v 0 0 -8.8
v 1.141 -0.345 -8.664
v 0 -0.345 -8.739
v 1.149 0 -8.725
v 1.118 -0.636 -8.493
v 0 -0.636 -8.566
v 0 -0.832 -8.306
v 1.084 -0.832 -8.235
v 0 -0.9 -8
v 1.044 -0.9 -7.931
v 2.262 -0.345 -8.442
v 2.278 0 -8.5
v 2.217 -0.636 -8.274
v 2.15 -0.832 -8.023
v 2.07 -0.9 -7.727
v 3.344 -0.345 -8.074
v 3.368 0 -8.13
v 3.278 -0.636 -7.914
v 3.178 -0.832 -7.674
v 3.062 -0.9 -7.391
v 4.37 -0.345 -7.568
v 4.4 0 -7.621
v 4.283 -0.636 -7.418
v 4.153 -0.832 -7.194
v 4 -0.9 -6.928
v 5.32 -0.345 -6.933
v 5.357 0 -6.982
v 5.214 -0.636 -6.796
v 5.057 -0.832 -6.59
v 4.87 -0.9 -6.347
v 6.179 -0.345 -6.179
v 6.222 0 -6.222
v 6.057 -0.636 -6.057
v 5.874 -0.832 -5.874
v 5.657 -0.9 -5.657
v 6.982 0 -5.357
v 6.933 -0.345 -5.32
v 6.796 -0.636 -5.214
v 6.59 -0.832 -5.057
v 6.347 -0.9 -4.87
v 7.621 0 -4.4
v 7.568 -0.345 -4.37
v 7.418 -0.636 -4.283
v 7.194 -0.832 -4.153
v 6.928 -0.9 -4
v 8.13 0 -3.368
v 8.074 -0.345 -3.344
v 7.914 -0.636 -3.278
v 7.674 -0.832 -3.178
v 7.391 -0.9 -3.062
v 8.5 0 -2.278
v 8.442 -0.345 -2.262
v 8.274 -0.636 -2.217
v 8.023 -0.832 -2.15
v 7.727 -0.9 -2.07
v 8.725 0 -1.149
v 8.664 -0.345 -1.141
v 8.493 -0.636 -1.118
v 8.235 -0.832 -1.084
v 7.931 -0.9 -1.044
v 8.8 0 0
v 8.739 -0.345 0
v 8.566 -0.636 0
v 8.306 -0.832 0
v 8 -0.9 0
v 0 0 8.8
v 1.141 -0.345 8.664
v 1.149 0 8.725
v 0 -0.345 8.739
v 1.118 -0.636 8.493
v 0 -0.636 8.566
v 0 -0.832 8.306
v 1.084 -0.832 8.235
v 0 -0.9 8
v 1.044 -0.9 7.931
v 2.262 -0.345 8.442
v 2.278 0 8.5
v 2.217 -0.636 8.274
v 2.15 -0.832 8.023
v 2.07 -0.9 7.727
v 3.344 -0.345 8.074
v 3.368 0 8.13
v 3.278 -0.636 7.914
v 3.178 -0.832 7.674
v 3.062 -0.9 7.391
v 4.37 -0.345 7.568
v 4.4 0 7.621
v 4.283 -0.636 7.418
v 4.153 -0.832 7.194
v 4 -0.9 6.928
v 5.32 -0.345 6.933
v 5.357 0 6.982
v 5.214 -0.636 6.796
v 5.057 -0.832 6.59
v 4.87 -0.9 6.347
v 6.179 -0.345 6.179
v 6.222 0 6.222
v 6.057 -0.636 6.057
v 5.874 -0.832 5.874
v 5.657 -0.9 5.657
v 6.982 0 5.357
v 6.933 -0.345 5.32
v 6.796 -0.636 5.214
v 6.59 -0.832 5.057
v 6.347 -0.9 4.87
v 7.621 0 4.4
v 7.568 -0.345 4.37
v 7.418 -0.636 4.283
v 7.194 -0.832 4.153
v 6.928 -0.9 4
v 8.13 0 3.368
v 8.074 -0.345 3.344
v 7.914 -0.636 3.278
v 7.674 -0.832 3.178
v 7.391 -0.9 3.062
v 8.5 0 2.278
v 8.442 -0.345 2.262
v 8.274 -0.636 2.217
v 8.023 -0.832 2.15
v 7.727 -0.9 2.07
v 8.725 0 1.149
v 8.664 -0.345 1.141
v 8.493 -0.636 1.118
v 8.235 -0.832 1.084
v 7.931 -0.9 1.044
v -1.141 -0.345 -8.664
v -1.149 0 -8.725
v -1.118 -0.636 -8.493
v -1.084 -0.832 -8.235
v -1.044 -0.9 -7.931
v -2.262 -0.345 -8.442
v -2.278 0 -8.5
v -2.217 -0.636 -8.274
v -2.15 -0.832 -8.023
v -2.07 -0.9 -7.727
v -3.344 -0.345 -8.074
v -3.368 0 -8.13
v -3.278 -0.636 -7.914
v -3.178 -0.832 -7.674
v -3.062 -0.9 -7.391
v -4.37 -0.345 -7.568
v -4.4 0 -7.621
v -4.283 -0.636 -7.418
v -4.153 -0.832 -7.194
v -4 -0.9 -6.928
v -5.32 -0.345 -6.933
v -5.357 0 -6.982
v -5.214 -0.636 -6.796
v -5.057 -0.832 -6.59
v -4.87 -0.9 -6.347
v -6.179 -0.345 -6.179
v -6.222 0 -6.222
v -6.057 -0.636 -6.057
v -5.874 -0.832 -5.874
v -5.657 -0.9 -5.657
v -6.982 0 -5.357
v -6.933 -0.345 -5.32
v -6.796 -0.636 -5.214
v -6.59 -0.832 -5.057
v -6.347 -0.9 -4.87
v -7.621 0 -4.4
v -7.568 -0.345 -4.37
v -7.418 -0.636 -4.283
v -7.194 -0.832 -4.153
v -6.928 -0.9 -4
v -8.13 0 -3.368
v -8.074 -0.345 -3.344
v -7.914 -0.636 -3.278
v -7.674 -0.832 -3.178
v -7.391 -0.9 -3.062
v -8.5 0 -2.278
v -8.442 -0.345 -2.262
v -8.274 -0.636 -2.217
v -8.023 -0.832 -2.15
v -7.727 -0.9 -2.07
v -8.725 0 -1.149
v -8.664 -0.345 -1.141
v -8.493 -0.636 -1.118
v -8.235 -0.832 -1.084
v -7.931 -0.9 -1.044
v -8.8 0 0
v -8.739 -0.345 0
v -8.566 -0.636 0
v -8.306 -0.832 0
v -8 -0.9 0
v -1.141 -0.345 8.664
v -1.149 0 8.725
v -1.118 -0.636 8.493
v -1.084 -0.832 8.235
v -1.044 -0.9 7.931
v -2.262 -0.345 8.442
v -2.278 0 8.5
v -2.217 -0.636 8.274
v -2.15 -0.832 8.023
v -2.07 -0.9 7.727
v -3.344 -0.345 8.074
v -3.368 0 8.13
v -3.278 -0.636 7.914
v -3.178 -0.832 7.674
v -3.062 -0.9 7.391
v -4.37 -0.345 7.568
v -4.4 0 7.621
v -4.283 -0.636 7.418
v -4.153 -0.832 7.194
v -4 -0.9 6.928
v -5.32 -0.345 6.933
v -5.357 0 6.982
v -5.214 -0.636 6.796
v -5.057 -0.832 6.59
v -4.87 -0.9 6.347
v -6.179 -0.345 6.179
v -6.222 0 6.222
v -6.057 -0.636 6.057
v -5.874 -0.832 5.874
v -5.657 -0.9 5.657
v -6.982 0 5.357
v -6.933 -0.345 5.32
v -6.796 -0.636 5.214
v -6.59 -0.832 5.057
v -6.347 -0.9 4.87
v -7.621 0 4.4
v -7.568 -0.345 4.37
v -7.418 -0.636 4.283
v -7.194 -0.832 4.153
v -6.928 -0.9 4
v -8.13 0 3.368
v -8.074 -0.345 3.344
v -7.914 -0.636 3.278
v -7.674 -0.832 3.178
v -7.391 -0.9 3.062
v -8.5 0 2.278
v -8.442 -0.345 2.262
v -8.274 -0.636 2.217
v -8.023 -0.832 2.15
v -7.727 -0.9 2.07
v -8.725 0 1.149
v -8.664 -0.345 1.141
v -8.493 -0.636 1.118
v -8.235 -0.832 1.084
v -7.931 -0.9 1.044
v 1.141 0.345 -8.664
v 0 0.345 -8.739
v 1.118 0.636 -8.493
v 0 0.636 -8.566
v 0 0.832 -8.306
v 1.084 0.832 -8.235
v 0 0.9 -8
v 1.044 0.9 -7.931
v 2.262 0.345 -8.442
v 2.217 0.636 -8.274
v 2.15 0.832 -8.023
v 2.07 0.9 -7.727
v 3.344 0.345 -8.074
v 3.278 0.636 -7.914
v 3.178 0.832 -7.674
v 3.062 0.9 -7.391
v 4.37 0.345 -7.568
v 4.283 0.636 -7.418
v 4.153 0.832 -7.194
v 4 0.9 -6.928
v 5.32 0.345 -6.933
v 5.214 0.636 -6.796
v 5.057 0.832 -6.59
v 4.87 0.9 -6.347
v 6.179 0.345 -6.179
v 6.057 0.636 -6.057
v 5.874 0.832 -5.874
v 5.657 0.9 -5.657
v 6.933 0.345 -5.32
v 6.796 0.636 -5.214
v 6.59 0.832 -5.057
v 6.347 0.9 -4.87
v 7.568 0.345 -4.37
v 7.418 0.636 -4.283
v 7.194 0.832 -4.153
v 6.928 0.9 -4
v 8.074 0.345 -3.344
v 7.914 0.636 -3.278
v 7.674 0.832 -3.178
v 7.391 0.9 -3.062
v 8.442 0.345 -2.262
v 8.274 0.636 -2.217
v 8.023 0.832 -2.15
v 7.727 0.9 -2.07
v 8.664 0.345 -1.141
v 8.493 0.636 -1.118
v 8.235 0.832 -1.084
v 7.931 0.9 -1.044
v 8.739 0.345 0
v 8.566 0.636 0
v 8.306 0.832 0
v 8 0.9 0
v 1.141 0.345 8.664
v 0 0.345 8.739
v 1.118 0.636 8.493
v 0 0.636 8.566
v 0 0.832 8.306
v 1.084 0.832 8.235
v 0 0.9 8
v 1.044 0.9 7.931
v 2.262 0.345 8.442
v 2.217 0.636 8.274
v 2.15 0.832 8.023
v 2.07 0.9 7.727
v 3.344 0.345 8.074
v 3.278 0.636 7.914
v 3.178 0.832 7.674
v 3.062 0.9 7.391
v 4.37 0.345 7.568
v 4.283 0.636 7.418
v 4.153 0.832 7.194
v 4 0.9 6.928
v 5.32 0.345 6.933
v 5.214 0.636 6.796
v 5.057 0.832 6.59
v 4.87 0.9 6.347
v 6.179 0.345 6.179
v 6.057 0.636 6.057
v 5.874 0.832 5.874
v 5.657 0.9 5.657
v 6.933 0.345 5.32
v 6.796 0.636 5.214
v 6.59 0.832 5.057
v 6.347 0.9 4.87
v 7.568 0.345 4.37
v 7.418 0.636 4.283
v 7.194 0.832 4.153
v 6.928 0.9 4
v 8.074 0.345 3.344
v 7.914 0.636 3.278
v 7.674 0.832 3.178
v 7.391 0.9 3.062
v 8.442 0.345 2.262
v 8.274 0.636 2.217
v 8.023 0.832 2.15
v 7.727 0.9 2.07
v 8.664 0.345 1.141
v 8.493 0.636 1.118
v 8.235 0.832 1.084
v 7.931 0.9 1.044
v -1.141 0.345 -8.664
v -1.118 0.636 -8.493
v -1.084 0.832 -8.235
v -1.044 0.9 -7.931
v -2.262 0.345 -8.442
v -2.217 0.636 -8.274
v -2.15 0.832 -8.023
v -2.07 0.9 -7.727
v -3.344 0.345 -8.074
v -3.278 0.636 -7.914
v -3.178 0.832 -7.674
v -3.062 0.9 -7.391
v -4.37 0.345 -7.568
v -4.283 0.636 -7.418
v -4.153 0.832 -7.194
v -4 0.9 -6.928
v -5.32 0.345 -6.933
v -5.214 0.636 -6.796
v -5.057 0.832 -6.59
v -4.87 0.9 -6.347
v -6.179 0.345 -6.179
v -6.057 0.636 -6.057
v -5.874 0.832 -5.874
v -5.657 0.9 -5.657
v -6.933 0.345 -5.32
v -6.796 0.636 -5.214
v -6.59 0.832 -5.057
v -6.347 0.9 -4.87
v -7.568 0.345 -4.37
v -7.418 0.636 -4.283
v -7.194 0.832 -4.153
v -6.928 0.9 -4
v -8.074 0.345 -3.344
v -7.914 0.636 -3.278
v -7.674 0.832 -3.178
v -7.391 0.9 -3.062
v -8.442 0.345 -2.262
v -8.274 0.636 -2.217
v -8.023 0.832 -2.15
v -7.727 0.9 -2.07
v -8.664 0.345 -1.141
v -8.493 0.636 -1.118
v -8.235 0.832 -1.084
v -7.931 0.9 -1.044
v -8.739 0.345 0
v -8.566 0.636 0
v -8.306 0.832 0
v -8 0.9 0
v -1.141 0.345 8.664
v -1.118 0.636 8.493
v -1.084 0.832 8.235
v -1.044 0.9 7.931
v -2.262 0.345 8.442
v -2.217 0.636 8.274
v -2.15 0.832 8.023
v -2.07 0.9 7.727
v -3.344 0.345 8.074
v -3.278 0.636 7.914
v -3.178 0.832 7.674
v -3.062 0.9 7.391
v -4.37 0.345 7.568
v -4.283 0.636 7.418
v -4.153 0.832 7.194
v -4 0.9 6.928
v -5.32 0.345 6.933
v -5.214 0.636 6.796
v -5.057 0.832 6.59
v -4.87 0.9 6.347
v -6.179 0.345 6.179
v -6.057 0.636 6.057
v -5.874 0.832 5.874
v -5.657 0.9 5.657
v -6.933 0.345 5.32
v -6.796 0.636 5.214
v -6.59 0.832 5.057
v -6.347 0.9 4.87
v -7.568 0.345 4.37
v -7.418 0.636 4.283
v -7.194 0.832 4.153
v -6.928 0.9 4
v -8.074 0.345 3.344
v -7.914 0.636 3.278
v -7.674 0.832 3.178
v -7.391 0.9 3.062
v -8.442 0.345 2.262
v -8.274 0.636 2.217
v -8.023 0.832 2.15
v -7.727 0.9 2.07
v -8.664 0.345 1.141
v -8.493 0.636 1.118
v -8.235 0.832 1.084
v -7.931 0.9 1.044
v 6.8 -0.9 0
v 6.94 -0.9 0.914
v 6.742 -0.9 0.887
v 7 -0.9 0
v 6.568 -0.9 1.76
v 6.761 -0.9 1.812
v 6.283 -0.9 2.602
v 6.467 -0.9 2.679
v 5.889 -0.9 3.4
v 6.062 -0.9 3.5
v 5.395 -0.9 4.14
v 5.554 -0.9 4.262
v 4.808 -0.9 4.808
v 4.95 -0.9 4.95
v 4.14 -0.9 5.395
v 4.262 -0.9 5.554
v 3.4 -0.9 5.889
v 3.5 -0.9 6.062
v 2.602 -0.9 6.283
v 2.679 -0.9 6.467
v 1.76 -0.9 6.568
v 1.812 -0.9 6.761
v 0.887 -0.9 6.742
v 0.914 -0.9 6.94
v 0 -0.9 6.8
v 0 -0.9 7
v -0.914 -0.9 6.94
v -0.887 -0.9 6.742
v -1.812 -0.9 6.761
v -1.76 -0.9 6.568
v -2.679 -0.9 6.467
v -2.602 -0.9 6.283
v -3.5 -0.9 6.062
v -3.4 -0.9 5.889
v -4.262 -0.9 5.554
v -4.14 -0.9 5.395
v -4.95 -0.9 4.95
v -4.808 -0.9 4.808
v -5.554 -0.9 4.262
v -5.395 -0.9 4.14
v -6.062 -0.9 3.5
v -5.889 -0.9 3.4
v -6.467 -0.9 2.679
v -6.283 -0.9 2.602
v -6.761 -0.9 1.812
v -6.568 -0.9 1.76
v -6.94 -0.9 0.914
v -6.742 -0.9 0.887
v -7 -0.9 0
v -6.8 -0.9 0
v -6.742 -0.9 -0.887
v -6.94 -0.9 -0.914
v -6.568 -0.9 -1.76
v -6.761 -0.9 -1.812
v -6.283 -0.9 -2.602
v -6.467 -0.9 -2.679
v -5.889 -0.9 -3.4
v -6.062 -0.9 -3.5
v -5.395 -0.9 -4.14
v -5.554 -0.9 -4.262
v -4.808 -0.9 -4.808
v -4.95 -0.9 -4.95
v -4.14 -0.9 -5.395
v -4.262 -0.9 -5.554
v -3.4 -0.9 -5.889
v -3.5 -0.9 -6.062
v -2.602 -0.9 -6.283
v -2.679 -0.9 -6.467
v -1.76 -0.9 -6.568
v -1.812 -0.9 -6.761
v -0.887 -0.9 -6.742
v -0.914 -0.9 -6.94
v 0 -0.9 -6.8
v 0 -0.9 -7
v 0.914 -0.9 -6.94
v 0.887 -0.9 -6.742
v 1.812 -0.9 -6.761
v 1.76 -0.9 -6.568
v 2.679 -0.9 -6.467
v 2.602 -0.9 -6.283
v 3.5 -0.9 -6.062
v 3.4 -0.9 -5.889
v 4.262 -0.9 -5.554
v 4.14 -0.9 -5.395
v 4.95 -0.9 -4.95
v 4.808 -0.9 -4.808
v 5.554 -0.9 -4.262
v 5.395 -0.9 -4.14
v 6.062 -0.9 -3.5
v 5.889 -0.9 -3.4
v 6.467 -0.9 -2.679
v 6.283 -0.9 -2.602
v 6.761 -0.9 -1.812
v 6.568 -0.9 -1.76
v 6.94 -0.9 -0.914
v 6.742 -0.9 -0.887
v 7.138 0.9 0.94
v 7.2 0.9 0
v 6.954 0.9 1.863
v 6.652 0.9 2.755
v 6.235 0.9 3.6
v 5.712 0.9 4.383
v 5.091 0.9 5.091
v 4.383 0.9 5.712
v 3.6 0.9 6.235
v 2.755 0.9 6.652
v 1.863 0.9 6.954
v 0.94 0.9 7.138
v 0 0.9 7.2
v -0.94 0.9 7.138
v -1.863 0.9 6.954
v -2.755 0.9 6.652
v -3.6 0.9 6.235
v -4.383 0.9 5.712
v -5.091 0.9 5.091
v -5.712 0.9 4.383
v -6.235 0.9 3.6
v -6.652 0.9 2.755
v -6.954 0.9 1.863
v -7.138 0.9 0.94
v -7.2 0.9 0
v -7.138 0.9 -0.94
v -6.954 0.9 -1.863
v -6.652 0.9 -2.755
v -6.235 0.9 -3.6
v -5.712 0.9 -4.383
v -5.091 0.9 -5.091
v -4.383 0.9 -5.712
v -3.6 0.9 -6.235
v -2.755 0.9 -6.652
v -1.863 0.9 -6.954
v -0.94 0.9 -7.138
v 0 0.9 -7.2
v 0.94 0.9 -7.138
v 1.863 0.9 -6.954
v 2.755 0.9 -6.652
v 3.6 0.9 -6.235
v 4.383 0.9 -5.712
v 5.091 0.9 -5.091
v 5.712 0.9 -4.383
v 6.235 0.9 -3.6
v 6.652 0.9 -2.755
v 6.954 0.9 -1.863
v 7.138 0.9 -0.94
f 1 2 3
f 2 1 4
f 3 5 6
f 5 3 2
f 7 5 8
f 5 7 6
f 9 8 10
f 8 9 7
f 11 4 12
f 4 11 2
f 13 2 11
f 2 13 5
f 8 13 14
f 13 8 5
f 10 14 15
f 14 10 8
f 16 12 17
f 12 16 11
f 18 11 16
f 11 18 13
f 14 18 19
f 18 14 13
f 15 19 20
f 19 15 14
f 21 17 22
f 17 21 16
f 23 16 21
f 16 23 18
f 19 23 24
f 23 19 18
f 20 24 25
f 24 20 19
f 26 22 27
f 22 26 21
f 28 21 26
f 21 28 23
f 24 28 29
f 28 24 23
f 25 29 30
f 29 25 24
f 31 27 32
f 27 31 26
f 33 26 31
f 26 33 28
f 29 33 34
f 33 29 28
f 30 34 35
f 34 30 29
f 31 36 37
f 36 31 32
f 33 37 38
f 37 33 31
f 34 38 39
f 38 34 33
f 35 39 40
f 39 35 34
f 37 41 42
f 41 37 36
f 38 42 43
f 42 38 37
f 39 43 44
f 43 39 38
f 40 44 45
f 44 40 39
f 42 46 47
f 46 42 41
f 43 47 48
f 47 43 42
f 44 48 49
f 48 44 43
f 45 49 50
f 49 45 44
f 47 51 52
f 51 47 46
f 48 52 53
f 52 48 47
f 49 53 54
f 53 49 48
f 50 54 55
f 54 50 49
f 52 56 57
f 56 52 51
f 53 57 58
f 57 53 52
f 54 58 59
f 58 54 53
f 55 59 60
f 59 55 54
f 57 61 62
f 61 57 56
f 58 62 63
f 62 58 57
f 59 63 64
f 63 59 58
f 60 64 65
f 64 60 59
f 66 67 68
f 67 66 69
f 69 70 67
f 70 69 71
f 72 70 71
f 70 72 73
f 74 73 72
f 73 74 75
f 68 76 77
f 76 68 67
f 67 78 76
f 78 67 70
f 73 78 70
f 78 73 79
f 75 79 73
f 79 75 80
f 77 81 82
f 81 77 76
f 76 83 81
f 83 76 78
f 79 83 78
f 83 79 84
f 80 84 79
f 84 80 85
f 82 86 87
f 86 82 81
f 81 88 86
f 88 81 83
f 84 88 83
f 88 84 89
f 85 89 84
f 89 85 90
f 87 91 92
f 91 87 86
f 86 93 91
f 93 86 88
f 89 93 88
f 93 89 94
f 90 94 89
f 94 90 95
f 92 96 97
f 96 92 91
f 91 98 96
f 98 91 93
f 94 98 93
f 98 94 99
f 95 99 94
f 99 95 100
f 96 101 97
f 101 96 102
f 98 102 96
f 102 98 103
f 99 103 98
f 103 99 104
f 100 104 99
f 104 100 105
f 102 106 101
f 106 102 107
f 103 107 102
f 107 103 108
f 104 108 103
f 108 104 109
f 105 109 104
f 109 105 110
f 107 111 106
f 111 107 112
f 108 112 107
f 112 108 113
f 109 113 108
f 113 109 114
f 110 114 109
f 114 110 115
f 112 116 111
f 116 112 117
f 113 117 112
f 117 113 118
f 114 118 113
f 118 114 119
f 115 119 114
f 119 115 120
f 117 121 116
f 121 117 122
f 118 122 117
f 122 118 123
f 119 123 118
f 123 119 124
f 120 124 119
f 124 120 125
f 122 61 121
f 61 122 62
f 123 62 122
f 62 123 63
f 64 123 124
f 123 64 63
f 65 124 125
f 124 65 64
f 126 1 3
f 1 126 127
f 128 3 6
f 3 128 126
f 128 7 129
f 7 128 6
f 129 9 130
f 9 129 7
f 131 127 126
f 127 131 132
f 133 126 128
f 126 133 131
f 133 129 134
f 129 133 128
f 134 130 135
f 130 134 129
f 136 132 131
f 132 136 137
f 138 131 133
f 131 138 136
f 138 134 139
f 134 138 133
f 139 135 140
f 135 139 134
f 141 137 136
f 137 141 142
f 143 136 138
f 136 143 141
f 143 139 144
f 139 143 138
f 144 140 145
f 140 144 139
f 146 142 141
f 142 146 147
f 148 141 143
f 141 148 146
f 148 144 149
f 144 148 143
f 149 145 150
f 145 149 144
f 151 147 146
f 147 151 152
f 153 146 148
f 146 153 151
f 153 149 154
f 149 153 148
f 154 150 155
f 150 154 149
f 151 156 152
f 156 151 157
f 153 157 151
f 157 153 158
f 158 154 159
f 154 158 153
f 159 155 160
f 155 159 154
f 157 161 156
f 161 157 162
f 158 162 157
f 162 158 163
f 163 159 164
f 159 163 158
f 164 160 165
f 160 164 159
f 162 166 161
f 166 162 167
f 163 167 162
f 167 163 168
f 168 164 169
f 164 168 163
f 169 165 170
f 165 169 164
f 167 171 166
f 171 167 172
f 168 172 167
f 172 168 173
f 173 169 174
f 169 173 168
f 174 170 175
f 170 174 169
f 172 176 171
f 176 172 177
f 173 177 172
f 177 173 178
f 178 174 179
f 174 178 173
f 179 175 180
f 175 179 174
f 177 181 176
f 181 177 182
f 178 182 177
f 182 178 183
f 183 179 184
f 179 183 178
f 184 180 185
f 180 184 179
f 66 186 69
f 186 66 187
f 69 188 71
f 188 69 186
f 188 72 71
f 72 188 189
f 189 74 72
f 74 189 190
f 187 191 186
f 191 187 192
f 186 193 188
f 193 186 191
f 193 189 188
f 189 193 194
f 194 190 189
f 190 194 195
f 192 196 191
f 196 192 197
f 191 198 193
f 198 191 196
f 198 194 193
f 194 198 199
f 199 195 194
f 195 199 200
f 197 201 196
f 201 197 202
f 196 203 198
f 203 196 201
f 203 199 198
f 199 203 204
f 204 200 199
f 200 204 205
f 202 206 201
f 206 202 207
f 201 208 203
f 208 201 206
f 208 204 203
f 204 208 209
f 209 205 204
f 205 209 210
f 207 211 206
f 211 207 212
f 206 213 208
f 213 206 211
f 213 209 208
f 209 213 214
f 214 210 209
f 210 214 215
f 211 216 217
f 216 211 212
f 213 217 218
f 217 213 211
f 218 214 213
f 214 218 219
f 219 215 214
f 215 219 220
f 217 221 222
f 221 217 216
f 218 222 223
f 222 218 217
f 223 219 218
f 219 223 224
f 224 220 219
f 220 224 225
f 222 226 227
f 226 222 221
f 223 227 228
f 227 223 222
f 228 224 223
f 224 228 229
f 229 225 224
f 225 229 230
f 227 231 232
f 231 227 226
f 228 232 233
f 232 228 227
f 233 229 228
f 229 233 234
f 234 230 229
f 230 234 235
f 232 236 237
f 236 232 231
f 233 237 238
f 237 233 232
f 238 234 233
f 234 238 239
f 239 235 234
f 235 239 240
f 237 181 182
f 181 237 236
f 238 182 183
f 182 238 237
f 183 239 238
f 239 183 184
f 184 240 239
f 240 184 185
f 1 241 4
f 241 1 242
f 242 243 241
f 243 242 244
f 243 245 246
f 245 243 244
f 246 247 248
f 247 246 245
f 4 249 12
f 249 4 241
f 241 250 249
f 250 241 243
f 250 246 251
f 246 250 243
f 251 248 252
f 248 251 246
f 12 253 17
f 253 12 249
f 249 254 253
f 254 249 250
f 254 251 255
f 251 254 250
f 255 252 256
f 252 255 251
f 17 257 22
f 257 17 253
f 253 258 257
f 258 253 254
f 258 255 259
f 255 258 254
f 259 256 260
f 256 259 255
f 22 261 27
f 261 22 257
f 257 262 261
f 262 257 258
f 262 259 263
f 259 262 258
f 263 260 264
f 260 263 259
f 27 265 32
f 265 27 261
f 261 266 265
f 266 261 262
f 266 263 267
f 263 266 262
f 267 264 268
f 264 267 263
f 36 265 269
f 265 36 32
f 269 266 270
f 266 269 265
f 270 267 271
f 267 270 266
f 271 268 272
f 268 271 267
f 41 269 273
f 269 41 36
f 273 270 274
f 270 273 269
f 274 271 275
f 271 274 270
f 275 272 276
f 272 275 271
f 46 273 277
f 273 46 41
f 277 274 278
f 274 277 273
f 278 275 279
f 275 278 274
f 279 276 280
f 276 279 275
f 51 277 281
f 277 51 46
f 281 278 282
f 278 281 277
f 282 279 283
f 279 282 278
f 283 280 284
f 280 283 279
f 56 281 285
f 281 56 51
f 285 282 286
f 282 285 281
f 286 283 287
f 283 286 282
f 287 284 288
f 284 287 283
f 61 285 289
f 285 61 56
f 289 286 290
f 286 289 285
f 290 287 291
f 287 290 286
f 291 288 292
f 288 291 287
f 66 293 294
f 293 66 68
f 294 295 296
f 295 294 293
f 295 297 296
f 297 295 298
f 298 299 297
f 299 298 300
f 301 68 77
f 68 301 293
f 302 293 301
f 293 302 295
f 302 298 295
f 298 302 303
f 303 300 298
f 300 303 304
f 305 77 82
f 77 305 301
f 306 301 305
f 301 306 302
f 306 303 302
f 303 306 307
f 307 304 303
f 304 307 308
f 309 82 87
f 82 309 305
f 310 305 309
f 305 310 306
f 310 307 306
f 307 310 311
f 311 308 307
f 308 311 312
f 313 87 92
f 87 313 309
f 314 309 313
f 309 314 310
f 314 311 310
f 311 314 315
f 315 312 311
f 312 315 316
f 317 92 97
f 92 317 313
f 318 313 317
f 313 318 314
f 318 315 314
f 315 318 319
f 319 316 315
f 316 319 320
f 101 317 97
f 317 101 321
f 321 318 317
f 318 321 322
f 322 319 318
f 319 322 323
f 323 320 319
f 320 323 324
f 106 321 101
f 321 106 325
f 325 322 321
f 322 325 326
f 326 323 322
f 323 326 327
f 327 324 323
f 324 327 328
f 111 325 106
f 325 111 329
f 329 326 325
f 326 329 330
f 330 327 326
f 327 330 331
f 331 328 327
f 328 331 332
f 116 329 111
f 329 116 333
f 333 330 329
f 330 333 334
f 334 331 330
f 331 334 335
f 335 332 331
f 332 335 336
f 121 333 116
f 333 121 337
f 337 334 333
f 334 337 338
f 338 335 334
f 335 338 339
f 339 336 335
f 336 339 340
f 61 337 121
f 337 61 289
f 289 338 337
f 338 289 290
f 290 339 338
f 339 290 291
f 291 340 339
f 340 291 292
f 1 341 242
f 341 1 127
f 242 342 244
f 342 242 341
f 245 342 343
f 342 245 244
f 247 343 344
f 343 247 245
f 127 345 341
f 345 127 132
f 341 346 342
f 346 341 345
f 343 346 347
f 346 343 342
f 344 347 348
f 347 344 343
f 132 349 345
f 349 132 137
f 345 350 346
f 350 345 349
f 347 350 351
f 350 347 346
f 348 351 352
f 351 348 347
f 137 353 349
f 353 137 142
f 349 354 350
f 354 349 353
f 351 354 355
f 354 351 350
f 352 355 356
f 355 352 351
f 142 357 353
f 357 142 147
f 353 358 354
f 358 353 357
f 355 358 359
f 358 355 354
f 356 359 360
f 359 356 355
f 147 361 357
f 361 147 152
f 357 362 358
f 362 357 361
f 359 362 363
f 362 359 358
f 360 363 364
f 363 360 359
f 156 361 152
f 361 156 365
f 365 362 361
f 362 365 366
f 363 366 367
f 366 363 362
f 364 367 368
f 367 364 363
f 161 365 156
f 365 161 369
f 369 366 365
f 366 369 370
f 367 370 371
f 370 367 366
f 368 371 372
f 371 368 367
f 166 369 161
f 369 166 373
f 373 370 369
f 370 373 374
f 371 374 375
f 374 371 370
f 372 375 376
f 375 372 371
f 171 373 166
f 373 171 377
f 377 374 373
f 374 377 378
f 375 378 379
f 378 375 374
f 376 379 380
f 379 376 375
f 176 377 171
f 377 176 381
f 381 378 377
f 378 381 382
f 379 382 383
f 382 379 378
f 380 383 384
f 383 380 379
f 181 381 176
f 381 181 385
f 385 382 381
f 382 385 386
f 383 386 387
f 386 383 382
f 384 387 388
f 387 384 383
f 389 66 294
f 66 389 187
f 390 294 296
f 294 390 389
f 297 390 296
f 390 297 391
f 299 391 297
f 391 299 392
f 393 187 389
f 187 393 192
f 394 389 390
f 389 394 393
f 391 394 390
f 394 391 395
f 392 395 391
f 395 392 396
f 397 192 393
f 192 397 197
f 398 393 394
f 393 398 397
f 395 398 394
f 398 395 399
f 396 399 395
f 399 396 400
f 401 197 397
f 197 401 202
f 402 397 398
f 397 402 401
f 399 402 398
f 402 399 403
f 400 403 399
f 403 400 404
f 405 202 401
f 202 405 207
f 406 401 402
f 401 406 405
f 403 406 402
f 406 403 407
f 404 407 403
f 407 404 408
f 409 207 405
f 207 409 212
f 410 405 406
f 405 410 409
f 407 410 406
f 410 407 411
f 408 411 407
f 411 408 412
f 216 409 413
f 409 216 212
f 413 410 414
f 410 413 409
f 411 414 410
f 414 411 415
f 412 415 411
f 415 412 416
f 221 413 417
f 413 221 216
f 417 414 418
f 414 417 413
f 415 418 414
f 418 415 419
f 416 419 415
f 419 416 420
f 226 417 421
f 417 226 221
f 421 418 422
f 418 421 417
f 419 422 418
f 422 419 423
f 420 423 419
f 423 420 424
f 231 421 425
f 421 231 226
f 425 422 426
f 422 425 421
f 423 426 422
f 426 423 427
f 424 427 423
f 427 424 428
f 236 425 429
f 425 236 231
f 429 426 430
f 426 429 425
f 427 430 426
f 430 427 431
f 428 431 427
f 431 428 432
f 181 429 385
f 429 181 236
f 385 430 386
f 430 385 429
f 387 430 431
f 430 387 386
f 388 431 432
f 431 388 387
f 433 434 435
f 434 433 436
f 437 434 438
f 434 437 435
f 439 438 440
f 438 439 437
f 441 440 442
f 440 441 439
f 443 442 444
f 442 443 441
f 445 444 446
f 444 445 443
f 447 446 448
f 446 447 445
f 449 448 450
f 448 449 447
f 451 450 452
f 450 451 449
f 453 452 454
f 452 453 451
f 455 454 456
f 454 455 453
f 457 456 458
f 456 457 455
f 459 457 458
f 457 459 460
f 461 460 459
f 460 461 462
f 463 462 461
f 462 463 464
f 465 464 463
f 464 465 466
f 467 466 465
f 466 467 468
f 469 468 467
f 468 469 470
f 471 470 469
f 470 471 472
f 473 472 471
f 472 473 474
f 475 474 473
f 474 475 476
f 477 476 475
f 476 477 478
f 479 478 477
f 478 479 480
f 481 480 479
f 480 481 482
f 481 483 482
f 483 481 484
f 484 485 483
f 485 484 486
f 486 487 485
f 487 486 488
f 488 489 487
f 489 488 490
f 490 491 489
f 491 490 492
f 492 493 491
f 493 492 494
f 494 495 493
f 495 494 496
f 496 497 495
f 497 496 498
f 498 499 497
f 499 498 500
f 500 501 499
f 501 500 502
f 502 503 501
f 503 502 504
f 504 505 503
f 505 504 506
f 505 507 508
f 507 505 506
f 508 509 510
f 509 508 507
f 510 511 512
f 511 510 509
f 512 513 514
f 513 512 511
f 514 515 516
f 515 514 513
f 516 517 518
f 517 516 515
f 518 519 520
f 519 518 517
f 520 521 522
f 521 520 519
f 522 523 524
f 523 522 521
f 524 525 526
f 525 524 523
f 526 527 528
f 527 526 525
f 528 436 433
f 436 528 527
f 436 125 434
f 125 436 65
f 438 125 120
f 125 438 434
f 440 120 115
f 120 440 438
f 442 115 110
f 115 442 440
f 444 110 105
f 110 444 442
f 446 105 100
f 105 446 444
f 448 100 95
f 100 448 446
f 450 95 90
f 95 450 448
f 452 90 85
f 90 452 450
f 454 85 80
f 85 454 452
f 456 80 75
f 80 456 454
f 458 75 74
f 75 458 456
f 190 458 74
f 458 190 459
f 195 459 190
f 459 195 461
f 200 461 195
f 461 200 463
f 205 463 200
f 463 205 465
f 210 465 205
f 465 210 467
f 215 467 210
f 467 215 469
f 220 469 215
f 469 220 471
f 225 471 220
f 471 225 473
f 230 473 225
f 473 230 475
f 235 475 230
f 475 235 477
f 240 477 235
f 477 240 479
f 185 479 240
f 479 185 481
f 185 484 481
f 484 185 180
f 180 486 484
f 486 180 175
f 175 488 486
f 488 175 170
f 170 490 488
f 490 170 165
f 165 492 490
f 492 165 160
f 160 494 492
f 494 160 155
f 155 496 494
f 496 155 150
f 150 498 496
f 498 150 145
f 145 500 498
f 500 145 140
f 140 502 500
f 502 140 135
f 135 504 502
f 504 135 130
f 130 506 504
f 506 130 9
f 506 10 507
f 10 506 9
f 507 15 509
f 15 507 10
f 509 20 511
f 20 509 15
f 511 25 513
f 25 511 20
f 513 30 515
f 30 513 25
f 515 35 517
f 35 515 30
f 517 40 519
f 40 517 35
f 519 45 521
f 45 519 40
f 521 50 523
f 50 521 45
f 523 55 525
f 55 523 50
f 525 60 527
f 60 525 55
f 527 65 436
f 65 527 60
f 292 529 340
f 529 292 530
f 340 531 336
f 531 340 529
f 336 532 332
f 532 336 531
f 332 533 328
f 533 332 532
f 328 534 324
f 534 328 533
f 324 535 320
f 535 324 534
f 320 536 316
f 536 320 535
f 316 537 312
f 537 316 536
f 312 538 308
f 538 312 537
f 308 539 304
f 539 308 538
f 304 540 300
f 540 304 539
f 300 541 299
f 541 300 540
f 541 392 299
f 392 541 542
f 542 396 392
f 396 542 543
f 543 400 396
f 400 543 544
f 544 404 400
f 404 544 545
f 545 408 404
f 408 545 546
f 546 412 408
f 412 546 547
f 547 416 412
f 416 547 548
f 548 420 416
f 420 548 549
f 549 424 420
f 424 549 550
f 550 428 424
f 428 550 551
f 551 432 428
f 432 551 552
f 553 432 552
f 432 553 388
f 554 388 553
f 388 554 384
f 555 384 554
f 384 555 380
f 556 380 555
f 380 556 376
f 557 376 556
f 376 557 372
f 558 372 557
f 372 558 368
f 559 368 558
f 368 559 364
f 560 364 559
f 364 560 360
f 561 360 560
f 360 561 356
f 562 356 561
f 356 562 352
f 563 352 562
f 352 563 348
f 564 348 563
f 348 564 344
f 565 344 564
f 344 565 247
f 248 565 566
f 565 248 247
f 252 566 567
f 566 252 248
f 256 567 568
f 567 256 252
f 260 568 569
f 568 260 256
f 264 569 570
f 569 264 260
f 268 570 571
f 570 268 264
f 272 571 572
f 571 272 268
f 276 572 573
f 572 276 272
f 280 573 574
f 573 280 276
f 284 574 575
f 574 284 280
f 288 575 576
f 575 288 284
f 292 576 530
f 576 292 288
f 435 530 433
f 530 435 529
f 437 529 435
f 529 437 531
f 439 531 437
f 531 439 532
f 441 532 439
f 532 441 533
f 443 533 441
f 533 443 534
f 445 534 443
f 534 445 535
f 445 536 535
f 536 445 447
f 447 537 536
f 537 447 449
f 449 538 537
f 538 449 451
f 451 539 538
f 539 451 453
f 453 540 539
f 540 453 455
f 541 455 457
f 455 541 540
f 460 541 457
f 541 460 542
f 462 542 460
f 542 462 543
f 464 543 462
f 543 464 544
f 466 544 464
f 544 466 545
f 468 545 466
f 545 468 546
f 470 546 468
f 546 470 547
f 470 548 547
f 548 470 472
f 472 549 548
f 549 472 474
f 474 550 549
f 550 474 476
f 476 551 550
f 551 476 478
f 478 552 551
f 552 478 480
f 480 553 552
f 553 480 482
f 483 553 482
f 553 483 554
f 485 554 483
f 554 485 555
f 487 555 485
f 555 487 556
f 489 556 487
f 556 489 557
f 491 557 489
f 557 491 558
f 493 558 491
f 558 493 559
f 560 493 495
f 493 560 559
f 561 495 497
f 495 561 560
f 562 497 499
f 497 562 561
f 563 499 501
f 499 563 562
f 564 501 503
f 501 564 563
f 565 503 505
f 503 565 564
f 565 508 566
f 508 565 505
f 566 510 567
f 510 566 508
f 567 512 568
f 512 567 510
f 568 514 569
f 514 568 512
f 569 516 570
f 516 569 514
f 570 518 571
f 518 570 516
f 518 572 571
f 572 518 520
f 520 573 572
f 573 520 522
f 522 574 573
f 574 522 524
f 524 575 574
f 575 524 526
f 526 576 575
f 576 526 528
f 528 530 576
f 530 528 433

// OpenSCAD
use <../../lib.scad>
use <../../p/48/4-4con17.scad>
use <../../p/48/4-4ring34.scad>
use <../../p/48/4-4ring7.scad>
use <../../p/48/4-4ring9.scad>
use <../../p/48/tm04o1000.scad>
function ldraw_lib__s__80441s02() = [
// 0 ~Wheel  2 x 21 with Technic Pin Hole Integral Tyre
// 0 Name: s\80441s02.dat
// 0 Author: Chris Böhnke [KnightOfTarenta]
// 0 !LDRAW_ORG Subpart UPDATE 2025-06
// 0 !LICENSE Licensed under CC BY 4.0 : see CAreadme.txt
// 
// 0 BFC CERTIFY CCW
  [0,"BFC","CERTIFY"],
  [0,"BFC","CCW"],
// 
// 0 !HISTORY 2025-01-25 [KnightOfTarenta] Based on s\92851s02.dat by Philippe Hurbain [Philo]
// 0 !HISTORY 2025-06-26 [OrionP] Official Update 2025-06
// 
// 0 // Front Torus Primitives
// 1 16 0 0 0 0 0 20 20 0 0 0 -22.5 0 48\tm04o1000.dat
  [1,16,0,0,0,0,0,20,20,0,0,0,-22.5,0, ldraw_lib__48__tm04o1000()],
// 1 16 0 0 0 0 0 20 -20 0 0 0 -22.5 0 48\tm04o1000.dat
  [1,16,0,0,0,0,0,20,-20,0,0,0,-22.5,0, ldraw_lib__48__tm04o1000()],
// 1 16 0 0 0 0 0 -20 20 0 0 0 -22.5 0 48\tm04o1000.dat
  [1,16,0,0,0,0,0,-20,20,0,0,0,-22.5,0, ldraw_lib__48__tm04o1000()],
// 1 16 0 0 0 0 0 -20 -20 0 0 0 -22.5 0 48\tm04o1000.dat
  [1,16,0,0,0,0,0,-20,-20,0,0,0,-22.5,0, ldraw_lib__48__tm04o1000()],
// 
// 0 // Back Torus Primitives
// 1 16 0 0 0 0 0 20 20 0 0 0 22.5 0 48\tm04o1000.dat
  [1,16,0,0,0,0,0,20,20,0,0,0,22.5,0, ldraw_lib__48__tm04o1000()],
// 1 16 0 0 0 0 0 20 -20 0 0 0 22.5 0 48\tm04o1000.dat
  [1,16,0,0,0,0,0,20,-20,0,0,0,22.5,0, ldraw_lib__48__tm04o1000()],
// 1 16 0 0 0 0 0 -20 20 0 0 0 22.5 0 48\tm04o1000.dat
  [1,16,0,0,0,0,0,-20,20,0,0,0,22.5,0, ldraw_lib__48__tm04o1000()],
// 1 16 0 0 0 0 0 -20 -20 0 0 0 22.5 0 48\tm04o1000.dat
  [1,16,0,0,0,0,0,-20,-20,0,0,0,22.5,0, ldraw_lib__48__tm04o1000()],
// 
// 0 // Inner Rings
// 1 16 0 0 -2.25 .5 0 0 0 0 -.5 0 1 0 48\4-4ring34.dat
  [1,16,0,0,-2.25,.5,0,0,0,0,-.5,0,1,0, ldraw_lib__48__4_4ring34()],
// 1 16 0 0 -2.25 2.5 0 0 0 0 -2.5 0 1 0 48\4-4ring7.dat
  [1,16,0,0,-2.25,2.5,0,0,0,0,-2.5,0,1,0, ldraw_lib__48__4_4ring7()],
// 1 16 0 0 2.25 2 0 0 0 0 -2 0 -1 0 48\4-4ring9.dat
  [1,16,0,0,2.25,2,0,0,0,0,-2,0,-1,0, ldraw_lib__48__4_4ring9()],
// 0 BFC INVERTNEXT
  [0,"BFC","INVERTNEXT"],
// 1 16 0 0 2.25 1 0 0 0 0 -1 0 -4.5 0 48\4-4con17.dat
  [1,16,0,0,2.25,1,0,0,0,0,-1,0,-4.5,0, ldraw_lib__48__4_4con17()],
];
module ldraw_lib__s__80441s02(step=0, col=false, unit=2/5, alt=false, line=0.2, solid=!$preview)
    makepoly(ldraw_lib__s__80441s02(), step=step, col=col, unit=unit, alt=alt, line=line, solid=solid);
ldraw_lib__s__80441s02(line=0.2);
